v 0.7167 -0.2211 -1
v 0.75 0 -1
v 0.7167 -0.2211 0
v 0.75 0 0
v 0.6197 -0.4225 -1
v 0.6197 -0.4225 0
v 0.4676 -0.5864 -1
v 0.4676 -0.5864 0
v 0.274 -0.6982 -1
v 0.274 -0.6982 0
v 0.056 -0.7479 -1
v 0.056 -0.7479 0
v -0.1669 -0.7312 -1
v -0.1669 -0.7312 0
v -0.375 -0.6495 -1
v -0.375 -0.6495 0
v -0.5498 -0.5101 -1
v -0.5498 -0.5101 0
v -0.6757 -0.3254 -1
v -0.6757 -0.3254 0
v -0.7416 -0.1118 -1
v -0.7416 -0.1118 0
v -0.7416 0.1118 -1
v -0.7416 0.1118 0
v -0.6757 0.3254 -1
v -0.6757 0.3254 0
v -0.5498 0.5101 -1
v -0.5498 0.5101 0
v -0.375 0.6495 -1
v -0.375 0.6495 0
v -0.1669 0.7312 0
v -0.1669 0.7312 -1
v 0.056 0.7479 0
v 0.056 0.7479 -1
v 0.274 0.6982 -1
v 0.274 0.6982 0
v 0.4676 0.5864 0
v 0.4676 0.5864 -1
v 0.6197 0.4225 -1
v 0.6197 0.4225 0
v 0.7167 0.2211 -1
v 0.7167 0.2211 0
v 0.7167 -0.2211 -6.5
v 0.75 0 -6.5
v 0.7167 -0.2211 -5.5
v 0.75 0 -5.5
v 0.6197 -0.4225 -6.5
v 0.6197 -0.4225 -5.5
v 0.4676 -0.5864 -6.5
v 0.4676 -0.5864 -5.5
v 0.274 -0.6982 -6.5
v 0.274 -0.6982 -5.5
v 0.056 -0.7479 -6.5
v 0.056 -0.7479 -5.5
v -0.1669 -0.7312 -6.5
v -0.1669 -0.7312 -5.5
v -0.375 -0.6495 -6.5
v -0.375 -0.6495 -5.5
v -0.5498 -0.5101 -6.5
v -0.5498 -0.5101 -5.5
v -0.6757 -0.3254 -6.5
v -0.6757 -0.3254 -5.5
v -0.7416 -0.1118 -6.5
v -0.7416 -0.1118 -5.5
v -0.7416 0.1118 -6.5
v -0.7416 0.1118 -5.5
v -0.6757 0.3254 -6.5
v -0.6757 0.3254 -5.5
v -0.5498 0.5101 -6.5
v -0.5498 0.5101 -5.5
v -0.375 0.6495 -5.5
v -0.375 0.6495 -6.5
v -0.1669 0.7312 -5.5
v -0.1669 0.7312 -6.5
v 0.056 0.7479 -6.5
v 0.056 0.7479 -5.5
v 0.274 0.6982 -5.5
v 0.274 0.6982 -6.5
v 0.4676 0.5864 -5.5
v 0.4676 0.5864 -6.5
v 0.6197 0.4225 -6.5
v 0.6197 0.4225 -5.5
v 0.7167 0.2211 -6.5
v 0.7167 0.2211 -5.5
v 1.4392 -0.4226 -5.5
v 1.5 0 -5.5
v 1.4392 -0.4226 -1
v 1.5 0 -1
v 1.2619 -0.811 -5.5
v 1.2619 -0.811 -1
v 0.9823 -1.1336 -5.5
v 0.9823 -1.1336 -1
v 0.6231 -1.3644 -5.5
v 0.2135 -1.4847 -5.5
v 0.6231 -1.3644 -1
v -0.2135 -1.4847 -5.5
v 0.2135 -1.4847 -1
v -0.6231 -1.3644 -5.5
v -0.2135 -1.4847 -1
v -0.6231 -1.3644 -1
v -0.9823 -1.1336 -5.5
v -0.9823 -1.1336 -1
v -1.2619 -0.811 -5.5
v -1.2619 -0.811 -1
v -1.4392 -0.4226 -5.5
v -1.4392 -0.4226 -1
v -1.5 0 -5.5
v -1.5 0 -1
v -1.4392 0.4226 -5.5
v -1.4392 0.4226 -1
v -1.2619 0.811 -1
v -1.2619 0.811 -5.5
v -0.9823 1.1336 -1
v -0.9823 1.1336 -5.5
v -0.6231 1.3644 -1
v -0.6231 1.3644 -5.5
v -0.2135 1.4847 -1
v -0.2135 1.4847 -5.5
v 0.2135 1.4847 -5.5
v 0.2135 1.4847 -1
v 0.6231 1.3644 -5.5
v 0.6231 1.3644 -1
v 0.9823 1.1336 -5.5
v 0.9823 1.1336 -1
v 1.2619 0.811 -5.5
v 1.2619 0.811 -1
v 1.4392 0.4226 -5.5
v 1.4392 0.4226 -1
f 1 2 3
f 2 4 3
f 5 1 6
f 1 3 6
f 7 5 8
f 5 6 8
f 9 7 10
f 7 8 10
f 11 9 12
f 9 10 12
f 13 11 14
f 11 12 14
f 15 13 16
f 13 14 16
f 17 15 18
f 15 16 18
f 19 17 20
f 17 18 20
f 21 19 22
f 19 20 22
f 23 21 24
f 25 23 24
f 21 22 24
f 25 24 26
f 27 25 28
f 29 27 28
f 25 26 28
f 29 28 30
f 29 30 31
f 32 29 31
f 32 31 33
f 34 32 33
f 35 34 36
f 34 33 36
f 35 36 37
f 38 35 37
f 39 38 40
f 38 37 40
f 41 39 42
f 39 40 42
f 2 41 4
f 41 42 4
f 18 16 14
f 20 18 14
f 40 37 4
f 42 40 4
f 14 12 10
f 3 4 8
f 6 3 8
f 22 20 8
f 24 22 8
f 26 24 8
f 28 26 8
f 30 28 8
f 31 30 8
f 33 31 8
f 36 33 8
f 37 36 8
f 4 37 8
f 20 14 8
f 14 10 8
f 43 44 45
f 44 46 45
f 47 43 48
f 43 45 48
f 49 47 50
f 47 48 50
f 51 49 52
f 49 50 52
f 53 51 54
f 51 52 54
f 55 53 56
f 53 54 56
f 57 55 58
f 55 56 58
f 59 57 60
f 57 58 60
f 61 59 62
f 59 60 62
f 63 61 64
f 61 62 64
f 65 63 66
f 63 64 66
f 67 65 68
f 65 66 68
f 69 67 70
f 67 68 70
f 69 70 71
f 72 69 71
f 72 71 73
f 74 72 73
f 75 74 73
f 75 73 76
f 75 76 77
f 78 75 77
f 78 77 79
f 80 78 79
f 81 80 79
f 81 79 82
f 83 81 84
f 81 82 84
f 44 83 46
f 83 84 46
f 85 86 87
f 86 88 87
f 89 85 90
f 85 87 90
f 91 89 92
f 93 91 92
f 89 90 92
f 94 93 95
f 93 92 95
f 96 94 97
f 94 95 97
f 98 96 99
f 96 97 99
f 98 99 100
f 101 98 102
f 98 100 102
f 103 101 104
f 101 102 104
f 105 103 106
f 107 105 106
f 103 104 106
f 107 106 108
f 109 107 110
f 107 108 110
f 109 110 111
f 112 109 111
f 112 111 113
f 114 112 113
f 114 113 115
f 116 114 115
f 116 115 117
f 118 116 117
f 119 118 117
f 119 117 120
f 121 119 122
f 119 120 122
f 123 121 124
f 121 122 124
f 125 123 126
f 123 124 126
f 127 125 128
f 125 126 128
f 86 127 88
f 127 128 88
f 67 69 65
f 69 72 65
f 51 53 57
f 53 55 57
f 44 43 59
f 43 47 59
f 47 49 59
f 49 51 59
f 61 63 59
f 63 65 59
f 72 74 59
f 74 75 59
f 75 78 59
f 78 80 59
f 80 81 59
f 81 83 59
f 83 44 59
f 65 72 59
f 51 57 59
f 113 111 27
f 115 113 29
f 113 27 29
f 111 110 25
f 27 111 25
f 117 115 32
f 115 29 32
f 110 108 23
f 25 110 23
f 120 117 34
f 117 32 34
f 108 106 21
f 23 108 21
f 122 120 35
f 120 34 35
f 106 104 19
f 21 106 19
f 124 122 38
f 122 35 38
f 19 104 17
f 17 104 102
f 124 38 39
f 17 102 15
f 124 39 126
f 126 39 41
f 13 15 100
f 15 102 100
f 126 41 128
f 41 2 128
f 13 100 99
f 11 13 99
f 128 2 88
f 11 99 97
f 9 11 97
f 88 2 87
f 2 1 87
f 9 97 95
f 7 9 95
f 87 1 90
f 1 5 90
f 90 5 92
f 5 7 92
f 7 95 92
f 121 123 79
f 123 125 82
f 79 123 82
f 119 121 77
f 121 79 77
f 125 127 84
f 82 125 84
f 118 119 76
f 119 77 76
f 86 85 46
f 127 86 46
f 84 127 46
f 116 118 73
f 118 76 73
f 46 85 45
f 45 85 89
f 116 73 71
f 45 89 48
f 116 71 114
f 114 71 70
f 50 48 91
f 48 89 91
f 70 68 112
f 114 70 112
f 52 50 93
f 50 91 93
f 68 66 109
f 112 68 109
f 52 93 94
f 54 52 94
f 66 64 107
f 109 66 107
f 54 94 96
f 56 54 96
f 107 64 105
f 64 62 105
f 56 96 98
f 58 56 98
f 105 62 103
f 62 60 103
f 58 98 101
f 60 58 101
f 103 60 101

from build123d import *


with BuildPart() as part:
    # Croquis1 → Revolución1 (revolve)
    with BuildSketch(Plane(origin=(0, 0, 0), x_dir=(0, 0, -1), z_dir=(1, 0, 0)), mode=Mode.PRIVATE) as revoluci_n1_sk:
        Polygon((0, 0), (6.5, 0), (6.5, 0.75), (5.5, 0.75), (5.5, 1.5), (1, 1.5), (1, 0.75), (0, 0.75), align=None)
    revolve(revoluci_n1_sk.sketch.rotate(Axis((0, 0, 0), (0, 0, -1)), 90), axis=Axis((0, 0, 0), (0, 0, -1)))


solid = part.part
